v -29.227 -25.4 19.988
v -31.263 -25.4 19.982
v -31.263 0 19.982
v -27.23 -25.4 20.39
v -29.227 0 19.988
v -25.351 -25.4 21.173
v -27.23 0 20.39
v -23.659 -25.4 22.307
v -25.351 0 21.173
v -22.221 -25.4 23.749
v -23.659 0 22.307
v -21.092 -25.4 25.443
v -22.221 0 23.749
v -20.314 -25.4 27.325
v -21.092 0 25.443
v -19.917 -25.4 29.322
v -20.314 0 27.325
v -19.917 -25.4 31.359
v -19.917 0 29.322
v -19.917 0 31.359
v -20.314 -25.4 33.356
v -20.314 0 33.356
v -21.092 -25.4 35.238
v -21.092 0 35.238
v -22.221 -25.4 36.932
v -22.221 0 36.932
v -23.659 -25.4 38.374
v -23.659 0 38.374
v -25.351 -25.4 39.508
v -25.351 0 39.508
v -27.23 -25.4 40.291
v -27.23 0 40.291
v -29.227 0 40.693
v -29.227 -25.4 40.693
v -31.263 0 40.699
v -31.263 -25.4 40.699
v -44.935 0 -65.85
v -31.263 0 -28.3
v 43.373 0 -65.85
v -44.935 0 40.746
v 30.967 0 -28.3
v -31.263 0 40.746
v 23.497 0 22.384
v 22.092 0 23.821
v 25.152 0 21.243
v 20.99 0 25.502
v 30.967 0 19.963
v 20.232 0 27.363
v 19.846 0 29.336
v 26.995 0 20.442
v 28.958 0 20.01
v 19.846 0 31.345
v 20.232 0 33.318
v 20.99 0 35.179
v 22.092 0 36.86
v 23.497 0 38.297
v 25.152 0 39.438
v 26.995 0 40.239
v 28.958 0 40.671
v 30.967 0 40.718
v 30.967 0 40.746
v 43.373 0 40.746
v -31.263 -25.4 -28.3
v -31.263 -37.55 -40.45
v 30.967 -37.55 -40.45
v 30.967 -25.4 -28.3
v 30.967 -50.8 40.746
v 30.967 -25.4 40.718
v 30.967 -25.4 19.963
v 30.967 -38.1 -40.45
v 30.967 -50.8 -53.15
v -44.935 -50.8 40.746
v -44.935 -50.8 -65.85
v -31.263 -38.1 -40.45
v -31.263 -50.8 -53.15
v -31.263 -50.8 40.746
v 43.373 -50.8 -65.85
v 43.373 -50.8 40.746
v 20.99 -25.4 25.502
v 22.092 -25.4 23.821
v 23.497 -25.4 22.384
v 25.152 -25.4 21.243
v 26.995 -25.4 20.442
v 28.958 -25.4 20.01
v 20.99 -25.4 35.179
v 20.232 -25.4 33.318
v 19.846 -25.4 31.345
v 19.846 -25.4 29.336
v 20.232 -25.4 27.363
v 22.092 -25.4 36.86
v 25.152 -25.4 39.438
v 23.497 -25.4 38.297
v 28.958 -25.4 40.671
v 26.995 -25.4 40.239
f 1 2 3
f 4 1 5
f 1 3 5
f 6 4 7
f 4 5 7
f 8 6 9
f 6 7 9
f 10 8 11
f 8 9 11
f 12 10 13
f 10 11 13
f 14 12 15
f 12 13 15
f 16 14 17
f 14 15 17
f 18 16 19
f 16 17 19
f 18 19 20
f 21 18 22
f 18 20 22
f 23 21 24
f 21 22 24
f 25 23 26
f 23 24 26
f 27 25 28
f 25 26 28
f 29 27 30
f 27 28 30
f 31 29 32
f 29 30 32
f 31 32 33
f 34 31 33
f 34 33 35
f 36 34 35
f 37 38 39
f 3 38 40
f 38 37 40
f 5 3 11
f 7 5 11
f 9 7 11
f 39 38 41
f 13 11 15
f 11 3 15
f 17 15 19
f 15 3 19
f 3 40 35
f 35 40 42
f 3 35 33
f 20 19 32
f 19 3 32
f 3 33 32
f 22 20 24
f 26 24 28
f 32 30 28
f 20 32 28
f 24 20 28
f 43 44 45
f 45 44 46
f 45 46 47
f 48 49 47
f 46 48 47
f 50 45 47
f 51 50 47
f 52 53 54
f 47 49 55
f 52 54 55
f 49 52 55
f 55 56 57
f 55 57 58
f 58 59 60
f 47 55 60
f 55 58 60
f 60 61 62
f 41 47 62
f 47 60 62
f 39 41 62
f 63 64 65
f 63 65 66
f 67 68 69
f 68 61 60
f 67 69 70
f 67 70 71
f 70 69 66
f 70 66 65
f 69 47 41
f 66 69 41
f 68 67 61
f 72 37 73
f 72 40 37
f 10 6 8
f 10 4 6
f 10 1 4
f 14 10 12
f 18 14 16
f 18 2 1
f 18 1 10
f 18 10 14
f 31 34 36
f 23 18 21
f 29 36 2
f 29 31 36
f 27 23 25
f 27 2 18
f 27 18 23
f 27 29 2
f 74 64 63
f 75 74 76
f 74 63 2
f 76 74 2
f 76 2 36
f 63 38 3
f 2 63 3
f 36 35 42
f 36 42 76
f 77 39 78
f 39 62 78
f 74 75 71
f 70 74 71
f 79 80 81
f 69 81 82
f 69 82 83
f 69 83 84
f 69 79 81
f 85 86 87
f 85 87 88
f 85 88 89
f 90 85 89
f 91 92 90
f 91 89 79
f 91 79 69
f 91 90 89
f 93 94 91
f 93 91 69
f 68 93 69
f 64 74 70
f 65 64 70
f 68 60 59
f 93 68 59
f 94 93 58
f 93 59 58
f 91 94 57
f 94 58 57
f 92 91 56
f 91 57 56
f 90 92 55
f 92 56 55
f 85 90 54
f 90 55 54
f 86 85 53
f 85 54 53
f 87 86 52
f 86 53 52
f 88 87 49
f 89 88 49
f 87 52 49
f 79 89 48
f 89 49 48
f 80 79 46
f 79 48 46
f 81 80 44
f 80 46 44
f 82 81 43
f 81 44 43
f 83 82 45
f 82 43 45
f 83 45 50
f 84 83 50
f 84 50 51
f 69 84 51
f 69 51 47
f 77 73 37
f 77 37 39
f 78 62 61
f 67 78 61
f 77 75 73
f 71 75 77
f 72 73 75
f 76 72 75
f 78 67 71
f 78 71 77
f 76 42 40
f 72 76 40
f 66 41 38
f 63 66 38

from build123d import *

# Parameters (mm, degrees)
F1_DEPTH    = 50.8
F2_R        = 10.405428205
F3_DEPTH    = 25.4
F4_T1_DEPTH = 62.2300039977
F5_W        = 88.3073359728
F5_H        = 50.8
F6_DEPTH    = 25.4
F7_SIZE     = 12.7


# Not quite as in the source:
# - a fillet or chamfer that OpenCascade refuses, or shapes differently, is made with other operations: its cross-section is extruded or revolved along the edge and cut away or added


with BuildPart() as f1:
    # F0 (on Front) → F1 (new body)
    with BuildSketch(Plane.XZ):
        Polygon((-31.2631689012, 40.7458357513), (-44.9346460508, 40.7458357513), (-44.9346460508, -40.4495000839), (43.372689922, -40.4495000839), (43.372689922, 40.7458357513), (30.9668350965, 40.7458357513), (30.9668350965, -28.2998345792), (-31.2631689012, -28.2998345792), align=None)
    extrude(amount=F1_DEPTH)

    # F2 (on Front) → F3 (join)
    with BuildSketch(Plane.XZ):
        with Locations((-30.2724801004, 30.3404075463)):
            Circle(F2_R)
        with Locations((30.2025526762, 30.3404075463)):
            Circle(F2_R)
    extrude(amount=F3_DEPTH)

    # F4: chamfer of 25.4 on 1 edges, made by hand

    # F4_s2 → F4_t1 (cut)
    with BuildSketch(Plane.YZ.offset(-31.2631689012)):
        Polygon((-50.8, -53.6998345792), (-25.4, -28.2998345792), (-50.8, -28.2998345792), align=None)
    extrude(amount=F4_T1_DEPTH, mode=Mode.SUBTRACT)

    # F5 (on face) → F6 (join)
    with BuildSketch(Plane(origin=(0, 0, -40.4495000839), x_dir=(1, 0, 0), z_dir=(0, 0, -1))):
        with Locations((-0.7809780644, 25.4)):
            Rectangle(F5_W, F5_H)
    extrude(amount=F6_DEPTH)

    # F7
    f7_edges = [f1.edges().sort_by_distance(p)[0] for p in [
        (-0.148167, -50.8, -40.4495),
    ]]
    chamfer(f7_edges, length=F7_SIZE)


solid = f1.part
